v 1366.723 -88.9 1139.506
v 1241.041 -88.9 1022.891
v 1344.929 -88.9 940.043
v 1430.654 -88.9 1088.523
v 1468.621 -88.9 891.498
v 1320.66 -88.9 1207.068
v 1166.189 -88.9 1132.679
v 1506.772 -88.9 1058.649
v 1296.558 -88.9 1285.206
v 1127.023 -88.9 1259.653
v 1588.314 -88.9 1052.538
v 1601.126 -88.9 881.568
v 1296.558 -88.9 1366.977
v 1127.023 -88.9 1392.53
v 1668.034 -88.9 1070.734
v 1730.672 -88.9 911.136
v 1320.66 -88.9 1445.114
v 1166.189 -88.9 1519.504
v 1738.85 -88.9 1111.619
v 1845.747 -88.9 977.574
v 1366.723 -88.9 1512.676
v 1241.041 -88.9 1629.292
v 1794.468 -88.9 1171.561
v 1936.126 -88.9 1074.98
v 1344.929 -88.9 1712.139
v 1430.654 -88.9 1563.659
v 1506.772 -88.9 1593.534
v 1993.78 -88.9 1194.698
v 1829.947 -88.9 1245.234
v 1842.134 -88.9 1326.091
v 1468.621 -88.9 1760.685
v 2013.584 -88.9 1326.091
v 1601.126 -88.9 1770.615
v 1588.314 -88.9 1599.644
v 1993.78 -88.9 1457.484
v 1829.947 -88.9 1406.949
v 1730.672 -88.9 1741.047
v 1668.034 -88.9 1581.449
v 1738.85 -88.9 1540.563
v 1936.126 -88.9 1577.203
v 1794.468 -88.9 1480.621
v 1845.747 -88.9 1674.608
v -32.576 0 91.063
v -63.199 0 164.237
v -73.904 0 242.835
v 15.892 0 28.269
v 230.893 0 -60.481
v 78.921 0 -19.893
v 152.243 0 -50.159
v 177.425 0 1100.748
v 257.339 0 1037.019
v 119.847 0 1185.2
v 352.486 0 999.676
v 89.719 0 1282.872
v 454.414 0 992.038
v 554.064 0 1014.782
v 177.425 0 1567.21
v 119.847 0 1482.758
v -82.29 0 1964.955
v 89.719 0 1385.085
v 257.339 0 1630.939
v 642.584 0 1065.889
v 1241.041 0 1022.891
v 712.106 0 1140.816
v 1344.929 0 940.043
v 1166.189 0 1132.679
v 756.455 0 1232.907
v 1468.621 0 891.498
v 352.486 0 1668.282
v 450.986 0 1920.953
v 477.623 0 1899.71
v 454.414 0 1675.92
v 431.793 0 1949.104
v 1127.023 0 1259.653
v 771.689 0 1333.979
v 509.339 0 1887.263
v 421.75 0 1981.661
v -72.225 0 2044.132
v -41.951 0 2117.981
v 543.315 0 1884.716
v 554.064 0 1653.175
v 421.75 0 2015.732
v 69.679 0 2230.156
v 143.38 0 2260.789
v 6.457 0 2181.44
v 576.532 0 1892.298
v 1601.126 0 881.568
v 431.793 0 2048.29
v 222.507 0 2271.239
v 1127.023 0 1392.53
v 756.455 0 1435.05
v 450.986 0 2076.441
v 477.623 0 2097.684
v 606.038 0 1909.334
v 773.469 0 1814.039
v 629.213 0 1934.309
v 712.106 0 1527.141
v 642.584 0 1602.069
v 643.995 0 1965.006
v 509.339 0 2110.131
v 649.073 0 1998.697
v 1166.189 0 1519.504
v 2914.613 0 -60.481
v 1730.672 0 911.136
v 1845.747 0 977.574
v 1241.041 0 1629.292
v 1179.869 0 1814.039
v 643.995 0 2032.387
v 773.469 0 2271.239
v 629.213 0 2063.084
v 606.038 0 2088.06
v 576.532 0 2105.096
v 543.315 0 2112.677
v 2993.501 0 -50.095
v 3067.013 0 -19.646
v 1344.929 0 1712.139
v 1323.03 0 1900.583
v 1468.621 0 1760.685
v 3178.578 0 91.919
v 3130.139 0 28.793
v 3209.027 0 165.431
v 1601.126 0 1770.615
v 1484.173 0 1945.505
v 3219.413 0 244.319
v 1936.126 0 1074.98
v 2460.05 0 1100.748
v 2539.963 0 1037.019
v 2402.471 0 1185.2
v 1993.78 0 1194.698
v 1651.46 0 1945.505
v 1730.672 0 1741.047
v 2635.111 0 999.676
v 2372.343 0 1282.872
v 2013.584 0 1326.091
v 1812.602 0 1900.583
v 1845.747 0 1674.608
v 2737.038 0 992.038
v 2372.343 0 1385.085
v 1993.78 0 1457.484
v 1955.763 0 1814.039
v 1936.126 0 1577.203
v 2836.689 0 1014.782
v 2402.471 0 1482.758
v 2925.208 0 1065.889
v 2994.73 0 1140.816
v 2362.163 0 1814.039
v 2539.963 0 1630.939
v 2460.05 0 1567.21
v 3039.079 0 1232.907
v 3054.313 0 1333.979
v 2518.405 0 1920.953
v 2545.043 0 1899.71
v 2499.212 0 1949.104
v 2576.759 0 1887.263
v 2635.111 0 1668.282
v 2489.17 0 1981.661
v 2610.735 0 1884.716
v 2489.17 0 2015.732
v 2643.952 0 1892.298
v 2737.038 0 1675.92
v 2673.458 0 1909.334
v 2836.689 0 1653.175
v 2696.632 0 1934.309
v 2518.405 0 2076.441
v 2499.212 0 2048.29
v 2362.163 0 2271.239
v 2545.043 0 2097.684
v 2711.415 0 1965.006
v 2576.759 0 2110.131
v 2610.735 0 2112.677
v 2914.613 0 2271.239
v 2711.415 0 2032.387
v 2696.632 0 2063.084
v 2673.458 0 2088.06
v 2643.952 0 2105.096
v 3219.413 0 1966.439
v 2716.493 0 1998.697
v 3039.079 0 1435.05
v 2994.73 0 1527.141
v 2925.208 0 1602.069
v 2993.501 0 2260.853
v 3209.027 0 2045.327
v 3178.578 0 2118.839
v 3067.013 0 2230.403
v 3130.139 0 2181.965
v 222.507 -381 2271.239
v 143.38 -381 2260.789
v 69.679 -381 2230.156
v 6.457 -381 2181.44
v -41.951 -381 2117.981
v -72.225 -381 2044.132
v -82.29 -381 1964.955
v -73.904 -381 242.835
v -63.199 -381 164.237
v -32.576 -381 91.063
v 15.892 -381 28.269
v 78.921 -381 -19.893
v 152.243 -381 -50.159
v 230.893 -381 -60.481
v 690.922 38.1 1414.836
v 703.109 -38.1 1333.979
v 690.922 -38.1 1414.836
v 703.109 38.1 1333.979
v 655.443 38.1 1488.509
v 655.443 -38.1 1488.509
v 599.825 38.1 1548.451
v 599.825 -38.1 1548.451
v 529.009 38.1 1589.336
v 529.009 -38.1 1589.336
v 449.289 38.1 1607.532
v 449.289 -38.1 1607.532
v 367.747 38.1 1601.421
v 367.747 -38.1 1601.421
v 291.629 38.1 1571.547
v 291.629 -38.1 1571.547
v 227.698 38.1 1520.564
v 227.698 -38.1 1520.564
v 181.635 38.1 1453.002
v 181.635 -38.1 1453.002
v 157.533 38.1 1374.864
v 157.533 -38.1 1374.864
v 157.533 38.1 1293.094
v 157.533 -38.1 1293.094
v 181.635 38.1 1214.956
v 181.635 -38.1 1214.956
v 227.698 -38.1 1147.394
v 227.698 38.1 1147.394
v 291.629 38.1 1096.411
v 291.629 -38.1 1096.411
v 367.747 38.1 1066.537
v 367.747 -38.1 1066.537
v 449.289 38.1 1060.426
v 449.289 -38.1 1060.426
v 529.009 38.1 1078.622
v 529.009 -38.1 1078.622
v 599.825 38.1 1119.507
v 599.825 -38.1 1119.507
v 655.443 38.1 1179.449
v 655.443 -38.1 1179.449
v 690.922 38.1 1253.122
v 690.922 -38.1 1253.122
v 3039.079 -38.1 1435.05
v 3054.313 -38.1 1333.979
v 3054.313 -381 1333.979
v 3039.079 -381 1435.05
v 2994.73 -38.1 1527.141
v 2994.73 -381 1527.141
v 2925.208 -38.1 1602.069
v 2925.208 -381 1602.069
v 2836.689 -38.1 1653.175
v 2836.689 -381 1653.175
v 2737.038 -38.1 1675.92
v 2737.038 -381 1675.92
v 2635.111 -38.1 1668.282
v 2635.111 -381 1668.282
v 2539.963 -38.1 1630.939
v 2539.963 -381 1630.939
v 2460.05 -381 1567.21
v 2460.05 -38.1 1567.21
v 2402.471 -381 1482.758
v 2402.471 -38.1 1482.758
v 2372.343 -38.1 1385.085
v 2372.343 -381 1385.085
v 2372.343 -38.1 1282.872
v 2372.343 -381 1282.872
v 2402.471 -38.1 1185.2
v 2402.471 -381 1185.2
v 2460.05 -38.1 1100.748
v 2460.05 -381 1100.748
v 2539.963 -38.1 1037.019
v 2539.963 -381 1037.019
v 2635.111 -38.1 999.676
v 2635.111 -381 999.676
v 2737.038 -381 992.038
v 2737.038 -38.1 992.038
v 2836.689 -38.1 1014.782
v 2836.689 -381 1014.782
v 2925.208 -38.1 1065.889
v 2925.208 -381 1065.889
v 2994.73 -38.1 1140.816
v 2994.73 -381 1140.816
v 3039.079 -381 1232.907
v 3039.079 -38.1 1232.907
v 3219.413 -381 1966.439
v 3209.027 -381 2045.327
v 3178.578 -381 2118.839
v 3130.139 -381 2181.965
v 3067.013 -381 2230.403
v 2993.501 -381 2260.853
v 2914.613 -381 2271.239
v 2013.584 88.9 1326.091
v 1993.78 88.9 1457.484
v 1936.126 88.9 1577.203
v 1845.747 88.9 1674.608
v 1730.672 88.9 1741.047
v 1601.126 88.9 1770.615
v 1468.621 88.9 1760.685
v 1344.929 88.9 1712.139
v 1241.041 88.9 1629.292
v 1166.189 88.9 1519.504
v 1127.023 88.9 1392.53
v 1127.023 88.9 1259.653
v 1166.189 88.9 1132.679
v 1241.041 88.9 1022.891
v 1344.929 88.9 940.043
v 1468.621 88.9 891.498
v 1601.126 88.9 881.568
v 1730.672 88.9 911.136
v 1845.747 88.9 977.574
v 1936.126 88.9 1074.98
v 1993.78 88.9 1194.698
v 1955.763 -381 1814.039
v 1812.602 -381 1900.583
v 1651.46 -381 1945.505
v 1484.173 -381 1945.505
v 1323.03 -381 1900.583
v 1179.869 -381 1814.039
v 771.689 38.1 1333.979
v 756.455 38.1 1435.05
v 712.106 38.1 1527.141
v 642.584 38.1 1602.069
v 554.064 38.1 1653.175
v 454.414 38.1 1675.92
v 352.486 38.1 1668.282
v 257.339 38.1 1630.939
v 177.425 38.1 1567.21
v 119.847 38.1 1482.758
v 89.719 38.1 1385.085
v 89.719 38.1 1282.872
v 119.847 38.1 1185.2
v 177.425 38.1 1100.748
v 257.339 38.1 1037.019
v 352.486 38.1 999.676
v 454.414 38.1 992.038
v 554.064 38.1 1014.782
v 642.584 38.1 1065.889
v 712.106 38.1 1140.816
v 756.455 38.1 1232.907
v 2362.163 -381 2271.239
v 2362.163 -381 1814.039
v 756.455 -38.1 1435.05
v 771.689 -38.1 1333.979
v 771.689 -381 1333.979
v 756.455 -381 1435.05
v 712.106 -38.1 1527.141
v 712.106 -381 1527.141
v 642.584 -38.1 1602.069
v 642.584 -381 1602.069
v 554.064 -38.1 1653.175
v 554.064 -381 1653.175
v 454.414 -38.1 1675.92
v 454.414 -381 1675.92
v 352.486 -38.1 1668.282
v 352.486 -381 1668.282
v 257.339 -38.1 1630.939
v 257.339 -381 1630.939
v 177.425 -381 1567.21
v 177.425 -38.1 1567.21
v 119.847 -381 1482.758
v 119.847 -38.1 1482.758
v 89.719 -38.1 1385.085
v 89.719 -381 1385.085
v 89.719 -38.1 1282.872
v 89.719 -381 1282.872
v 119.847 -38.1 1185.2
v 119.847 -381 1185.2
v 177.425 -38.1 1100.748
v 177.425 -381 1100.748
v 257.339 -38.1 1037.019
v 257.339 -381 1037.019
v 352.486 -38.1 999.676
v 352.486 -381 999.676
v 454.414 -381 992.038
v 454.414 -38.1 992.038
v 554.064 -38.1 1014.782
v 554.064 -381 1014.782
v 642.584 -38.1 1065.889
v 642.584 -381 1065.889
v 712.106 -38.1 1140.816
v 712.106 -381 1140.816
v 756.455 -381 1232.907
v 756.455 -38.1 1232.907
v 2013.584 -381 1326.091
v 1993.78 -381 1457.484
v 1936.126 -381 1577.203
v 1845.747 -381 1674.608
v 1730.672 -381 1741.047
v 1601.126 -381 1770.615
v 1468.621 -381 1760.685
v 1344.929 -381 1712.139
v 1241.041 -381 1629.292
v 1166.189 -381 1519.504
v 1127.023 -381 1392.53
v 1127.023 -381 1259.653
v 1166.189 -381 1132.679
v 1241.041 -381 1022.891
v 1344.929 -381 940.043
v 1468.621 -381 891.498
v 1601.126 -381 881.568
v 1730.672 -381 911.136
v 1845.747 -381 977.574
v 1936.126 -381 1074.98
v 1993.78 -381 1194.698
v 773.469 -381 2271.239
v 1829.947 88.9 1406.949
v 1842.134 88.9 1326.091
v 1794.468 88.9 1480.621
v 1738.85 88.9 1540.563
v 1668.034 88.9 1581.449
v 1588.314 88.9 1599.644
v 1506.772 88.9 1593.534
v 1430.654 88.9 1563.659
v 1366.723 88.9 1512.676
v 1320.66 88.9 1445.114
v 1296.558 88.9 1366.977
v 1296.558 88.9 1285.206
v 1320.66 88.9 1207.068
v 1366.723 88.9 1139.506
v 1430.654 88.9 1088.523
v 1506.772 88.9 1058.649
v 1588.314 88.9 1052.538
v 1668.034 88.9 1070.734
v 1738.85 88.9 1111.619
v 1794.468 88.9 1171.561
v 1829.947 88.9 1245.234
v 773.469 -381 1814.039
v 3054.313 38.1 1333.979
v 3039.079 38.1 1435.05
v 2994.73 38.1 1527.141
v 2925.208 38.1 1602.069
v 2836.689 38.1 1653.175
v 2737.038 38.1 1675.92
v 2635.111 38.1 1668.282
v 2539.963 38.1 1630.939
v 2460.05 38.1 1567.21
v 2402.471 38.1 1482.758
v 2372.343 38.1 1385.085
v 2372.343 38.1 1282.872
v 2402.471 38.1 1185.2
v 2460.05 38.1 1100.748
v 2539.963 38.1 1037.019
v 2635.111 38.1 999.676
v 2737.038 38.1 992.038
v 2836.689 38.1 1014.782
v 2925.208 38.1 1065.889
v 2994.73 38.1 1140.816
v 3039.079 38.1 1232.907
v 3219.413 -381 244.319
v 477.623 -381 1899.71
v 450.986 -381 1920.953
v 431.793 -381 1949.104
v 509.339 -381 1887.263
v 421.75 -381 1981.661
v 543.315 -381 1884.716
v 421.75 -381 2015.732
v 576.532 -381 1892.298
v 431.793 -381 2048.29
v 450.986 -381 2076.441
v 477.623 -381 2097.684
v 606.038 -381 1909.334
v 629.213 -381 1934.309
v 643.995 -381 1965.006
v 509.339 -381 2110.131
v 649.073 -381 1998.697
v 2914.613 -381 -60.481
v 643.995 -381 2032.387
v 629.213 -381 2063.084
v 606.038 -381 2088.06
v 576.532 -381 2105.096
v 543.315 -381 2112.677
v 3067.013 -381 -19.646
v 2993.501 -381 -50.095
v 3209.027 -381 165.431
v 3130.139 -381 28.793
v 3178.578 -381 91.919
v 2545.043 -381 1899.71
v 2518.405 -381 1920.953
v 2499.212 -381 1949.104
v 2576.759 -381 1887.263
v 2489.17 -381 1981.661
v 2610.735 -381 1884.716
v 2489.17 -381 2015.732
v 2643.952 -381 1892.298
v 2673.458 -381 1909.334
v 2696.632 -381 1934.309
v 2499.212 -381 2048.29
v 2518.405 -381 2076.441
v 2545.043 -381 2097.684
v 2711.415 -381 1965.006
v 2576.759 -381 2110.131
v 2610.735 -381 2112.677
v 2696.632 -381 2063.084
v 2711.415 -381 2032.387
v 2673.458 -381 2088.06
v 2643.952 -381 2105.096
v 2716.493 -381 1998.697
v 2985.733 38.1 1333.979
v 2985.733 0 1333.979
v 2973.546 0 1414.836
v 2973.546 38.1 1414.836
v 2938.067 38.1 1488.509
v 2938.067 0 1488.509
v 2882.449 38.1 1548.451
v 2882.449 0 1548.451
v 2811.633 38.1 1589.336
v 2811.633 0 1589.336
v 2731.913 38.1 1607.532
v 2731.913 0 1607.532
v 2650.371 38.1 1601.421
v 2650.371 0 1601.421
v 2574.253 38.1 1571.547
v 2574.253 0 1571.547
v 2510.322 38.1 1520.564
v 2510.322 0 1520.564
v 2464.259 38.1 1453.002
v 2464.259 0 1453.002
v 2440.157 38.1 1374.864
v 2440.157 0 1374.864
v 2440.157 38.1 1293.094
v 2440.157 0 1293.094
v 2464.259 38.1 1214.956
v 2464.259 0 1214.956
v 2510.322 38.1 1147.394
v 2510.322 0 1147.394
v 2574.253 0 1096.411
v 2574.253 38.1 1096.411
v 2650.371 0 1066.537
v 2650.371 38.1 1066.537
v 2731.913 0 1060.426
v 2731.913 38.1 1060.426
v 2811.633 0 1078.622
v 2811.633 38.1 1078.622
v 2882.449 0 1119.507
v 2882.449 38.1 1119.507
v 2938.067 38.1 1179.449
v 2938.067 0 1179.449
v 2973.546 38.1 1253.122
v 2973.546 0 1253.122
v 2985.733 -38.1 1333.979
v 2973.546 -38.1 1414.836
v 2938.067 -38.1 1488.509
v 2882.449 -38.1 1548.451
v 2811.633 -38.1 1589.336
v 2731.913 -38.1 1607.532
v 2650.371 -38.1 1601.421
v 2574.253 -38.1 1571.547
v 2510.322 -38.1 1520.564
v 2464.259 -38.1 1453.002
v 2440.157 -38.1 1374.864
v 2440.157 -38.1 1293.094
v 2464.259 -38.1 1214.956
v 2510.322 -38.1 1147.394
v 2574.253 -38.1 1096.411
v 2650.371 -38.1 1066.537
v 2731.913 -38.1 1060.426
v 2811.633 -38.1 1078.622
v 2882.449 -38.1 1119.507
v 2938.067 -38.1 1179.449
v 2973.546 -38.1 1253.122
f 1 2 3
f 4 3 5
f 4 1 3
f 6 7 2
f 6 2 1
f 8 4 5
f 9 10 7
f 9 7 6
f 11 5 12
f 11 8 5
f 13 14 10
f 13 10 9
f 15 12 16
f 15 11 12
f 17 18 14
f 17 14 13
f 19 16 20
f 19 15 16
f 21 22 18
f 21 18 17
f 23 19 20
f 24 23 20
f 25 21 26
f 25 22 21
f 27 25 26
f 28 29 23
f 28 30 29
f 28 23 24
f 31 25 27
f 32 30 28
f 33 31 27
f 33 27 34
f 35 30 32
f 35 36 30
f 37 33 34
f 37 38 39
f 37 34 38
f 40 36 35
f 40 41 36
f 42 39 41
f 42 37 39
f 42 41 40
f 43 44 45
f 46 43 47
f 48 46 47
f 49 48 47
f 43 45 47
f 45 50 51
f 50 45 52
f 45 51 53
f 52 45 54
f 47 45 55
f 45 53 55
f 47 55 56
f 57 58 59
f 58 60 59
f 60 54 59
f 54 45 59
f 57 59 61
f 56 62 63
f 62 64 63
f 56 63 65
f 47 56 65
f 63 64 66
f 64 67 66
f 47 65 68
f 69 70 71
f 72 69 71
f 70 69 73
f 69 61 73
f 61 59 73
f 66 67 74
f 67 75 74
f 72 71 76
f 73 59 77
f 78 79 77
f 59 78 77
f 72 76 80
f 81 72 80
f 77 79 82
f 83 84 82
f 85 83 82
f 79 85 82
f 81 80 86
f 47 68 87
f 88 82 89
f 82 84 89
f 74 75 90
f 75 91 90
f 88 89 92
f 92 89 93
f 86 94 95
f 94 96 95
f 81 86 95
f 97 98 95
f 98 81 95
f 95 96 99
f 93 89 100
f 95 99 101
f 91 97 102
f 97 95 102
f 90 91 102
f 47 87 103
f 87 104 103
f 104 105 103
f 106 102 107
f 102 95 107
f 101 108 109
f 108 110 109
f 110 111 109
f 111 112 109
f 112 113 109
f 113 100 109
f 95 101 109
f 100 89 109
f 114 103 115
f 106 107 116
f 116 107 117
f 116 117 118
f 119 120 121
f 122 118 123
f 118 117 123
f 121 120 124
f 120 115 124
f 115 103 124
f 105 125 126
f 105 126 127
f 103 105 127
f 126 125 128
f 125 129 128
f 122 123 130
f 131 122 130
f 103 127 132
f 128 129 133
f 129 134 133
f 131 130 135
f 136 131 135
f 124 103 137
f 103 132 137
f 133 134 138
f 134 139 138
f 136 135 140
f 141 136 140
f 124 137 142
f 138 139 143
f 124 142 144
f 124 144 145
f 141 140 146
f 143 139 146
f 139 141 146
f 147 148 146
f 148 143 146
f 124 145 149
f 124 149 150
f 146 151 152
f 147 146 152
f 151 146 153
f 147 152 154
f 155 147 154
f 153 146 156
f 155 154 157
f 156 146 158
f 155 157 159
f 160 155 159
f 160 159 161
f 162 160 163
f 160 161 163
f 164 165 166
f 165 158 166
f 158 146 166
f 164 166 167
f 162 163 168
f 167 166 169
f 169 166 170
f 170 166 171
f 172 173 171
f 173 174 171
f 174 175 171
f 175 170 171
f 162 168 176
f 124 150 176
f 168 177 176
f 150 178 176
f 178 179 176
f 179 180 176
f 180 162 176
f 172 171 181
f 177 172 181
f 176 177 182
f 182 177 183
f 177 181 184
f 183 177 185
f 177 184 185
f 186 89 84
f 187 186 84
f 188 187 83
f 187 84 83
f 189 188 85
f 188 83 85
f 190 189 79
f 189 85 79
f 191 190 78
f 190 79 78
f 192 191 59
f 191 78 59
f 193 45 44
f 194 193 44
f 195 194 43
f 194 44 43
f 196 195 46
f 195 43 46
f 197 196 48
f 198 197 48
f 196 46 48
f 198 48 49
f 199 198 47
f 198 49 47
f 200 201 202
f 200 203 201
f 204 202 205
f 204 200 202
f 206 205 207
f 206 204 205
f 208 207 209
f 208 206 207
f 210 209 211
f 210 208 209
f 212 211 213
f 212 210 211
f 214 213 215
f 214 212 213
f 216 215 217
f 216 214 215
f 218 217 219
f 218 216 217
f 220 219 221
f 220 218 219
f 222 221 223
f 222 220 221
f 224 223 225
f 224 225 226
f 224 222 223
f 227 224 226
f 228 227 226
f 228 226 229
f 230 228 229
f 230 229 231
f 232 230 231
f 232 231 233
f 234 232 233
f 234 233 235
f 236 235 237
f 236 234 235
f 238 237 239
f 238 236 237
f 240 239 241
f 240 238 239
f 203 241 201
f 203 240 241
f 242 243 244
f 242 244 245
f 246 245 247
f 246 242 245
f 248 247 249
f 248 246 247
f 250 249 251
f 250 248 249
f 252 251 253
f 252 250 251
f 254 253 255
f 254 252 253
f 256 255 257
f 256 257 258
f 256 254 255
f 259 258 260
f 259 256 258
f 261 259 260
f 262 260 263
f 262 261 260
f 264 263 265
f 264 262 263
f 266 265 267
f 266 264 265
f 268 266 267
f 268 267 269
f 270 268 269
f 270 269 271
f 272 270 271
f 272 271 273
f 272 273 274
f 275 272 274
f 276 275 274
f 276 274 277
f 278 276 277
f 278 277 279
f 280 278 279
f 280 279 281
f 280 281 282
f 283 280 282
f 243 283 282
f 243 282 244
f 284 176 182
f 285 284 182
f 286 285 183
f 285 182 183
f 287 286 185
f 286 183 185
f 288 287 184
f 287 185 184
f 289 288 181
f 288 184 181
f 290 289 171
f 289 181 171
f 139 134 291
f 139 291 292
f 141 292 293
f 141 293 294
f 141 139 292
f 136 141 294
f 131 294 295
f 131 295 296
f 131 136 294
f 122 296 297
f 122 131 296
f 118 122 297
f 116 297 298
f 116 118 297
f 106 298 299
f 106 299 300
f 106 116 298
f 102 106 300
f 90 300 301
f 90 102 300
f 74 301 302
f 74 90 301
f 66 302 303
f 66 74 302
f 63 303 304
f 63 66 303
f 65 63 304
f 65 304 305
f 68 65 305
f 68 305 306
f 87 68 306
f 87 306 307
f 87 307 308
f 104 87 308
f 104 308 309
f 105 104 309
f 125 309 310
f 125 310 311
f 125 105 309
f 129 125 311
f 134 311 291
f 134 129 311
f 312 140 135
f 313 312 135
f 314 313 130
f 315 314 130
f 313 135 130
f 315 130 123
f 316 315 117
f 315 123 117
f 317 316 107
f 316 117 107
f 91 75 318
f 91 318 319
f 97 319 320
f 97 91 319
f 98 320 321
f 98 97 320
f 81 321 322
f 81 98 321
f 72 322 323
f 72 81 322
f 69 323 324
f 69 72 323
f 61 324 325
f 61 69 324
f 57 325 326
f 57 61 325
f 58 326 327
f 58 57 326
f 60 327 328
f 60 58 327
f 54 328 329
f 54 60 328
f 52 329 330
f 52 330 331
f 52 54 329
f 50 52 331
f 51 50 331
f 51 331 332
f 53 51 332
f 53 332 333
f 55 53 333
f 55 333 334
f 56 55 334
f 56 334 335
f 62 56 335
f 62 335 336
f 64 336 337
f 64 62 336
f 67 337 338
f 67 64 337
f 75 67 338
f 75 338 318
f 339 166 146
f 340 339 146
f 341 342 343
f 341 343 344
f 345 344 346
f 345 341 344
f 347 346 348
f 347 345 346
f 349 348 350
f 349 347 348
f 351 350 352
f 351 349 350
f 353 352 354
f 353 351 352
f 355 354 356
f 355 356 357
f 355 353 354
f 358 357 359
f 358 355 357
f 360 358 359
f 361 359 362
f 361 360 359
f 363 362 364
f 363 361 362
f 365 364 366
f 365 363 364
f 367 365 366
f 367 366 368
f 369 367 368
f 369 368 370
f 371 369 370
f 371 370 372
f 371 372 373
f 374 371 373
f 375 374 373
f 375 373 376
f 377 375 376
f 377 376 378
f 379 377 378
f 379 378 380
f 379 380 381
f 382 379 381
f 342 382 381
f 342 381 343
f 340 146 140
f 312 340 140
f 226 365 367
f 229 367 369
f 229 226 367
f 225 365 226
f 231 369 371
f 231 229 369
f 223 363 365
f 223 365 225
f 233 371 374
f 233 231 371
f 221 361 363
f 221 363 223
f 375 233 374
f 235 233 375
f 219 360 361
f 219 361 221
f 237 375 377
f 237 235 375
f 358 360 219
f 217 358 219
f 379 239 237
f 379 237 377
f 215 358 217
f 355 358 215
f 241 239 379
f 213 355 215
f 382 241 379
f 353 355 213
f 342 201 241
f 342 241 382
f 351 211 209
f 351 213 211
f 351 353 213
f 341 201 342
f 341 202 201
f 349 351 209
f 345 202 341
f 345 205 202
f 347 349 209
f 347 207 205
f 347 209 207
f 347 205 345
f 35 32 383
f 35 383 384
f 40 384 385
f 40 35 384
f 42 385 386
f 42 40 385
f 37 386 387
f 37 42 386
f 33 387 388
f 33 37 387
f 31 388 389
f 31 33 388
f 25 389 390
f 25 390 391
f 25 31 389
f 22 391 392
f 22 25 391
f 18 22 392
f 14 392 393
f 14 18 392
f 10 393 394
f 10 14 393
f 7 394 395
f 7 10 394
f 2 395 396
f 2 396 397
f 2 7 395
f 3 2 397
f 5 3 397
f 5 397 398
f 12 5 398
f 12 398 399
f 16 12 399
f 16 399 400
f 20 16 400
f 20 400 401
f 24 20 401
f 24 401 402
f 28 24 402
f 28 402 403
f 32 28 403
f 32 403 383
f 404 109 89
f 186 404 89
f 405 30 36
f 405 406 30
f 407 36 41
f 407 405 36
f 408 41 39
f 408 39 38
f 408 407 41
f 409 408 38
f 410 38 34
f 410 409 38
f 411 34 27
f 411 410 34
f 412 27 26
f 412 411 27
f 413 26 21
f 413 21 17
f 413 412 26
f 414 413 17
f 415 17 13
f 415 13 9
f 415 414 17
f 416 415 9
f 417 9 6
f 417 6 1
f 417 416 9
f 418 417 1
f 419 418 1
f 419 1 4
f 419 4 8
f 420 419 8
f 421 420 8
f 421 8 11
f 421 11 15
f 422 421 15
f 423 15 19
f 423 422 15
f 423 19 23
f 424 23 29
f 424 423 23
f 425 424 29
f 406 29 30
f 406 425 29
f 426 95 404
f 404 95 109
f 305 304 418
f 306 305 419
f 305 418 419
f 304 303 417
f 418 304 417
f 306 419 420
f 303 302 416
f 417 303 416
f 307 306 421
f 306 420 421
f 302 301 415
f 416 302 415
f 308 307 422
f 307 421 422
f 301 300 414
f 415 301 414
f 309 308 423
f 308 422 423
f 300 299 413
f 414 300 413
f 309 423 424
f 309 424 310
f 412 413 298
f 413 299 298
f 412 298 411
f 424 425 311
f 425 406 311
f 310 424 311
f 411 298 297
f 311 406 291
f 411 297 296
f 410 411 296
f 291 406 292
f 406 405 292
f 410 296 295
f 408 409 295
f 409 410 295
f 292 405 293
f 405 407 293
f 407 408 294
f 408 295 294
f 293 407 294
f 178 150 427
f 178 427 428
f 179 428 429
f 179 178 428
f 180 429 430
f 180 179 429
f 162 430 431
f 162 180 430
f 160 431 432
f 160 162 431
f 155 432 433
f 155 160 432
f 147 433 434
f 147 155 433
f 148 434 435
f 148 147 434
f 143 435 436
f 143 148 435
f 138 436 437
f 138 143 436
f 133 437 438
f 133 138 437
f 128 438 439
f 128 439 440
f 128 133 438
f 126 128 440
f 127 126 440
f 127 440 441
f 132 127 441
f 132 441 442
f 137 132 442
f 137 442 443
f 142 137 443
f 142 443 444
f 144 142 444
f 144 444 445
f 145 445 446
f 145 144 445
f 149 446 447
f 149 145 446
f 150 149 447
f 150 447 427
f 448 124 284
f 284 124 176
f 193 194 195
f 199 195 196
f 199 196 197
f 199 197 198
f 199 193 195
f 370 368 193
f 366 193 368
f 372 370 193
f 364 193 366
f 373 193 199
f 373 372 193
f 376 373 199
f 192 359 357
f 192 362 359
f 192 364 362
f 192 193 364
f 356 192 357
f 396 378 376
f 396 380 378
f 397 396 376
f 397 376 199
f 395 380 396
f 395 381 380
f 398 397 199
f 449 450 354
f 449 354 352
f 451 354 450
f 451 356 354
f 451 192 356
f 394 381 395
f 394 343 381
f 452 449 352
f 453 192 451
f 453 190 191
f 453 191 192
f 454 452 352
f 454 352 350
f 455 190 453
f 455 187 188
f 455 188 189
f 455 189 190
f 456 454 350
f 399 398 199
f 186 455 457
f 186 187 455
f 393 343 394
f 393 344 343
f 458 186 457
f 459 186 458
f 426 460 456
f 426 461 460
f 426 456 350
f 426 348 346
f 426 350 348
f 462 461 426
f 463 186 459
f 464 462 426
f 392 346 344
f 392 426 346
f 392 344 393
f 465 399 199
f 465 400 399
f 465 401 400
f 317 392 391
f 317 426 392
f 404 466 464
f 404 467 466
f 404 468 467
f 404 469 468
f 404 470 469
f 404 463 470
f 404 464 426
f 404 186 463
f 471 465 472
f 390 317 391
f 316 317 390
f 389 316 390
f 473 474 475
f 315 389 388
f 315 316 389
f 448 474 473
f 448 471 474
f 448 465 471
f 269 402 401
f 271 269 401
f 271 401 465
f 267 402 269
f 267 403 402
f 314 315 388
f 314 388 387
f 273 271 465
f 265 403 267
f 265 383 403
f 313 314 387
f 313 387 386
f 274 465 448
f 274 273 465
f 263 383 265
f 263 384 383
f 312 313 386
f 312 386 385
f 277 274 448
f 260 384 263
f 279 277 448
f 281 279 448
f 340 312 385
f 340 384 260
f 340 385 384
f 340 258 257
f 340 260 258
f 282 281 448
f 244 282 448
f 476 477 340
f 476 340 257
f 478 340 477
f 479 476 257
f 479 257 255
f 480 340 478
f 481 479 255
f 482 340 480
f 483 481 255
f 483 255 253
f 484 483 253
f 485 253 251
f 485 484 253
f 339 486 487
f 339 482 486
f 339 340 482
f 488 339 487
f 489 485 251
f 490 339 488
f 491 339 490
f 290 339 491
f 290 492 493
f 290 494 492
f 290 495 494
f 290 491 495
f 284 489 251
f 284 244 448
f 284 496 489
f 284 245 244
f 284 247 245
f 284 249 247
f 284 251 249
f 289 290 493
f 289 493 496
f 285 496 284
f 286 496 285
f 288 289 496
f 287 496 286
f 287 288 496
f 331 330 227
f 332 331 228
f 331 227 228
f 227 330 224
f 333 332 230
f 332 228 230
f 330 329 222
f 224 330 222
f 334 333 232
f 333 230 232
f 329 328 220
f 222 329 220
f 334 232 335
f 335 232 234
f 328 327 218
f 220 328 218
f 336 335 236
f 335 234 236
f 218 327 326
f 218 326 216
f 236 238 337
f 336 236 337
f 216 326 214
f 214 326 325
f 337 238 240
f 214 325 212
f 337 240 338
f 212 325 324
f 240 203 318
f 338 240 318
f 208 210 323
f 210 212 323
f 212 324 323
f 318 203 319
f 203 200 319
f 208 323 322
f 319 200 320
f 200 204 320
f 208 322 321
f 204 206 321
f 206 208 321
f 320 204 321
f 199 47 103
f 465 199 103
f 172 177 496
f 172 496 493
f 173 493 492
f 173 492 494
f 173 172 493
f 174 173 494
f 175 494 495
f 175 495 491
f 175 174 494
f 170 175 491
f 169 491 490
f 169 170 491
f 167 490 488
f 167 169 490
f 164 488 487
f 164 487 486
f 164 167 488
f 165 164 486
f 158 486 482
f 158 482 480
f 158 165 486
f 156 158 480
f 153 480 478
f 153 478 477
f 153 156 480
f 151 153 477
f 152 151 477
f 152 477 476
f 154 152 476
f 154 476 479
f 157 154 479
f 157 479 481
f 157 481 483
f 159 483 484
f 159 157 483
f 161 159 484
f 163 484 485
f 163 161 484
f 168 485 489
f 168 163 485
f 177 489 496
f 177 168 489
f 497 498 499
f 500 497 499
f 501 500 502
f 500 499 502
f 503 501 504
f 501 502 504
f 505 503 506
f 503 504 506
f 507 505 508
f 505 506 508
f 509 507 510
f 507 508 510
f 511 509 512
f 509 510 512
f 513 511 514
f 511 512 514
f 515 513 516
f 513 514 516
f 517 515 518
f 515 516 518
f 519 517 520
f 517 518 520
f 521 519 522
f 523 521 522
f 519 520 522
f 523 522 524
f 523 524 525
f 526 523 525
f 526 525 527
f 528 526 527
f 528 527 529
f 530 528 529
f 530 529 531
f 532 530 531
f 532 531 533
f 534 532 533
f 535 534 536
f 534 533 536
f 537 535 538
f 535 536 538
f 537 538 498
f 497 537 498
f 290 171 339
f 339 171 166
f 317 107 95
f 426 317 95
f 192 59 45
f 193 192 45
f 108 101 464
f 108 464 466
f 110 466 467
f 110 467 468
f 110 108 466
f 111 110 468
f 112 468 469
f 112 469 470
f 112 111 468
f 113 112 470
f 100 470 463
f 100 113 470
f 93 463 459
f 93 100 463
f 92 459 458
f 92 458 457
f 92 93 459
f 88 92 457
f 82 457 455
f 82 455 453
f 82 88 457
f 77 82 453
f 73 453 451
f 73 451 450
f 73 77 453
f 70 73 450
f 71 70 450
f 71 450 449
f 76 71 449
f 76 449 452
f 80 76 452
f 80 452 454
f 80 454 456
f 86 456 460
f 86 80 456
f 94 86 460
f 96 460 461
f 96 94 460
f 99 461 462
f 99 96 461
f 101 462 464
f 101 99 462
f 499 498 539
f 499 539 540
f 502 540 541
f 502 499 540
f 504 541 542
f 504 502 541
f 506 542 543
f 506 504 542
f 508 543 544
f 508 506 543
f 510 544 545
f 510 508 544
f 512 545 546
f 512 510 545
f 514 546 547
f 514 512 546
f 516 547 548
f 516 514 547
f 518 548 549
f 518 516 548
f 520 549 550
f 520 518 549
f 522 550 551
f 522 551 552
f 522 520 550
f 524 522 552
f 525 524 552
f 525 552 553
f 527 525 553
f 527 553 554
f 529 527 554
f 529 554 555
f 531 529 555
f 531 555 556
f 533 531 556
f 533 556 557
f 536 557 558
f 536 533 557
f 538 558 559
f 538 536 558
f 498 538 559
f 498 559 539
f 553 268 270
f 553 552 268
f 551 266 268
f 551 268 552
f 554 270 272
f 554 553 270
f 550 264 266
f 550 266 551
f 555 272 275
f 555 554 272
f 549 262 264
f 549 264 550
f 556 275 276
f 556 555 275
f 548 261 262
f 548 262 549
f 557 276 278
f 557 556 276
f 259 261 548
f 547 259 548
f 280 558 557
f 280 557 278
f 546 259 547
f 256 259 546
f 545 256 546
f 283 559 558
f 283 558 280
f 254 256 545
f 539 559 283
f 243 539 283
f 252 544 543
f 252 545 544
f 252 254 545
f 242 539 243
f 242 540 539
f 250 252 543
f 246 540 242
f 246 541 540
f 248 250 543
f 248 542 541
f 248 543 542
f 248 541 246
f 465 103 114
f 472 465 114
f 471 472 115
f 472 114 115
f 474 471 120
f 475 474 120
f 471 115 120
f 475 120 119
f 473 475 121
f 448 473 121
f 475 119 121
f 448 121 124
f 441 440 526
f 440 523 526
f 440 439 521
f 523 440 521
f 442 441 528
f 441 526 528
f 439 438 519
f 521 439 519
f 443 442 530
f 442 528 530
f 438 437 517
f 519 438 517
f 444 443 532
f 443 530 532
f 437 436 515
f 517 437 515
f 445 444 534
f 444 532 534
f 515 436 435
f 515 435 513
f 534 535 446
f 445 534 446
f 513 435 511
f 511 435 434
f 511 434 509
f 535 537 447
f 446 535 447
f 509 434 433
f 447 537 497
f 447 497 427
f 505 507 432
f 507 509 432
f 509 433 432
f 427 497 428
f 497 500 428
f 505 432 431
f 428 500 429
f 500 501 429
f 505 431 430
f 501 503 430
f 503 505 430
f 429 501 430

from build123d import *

# Parameters (mm, degrees)
F0_R     = 342.9
F0_R_2   = 445.77
F0_R_3   = 114.3
F1_DEPTH = 381
F0_R_4   = 274.32
F2_DEPTH = 88.9
F3_DEPTH = 38.1


with BuildPart() as f1:
    # F0 (on Front) → F1 (new body)
    with BuildSketch(Plane.XZ):
        with BuildLine():
            ThreePointArc((-73.903867776, 242.8346680415), (15.8917497981, 28.2686029567), (230.8925186905, -60.4811497033))
            Line((230.8925186905, -60.4811497033), (2914.6131049652, -60.4811497033))
            ThreePointArc((2914.6131049652, -60.4811497033), (3130.1392518708, 28.7927033911), (3219.4131049652, 244.3188502967))
            Line((3219.4131049652, 244.3188502967), (3219.4131049652, 1966.4388502967))
            ThreePointArc((3219.4131049652, 1966.4388502967), (3130.1392518708, 2181.9649972024), (2914.6131049652, 2271.2388502967))
            Line((2914.6131049652, 2271.2388502967), (2362.1631049652, 2271.2388502967))
            Line((2362.1631049652, 2271.2388502967), (2362.1631049652, 1814.0388502967))
            Line((2362.1631049652, 1814.0388502967), (1955.7631049652, 1814.0388502967))
            ThreePointArc((1955.7631049652, 1814.0388502967), (1567.816040535, 1951.1988502967), (1179.8689761048, 1814.0388502967))
            Line((1179.8689761048, 1814.0388502967), (773.4689761048, 1814.0388502967))
            Line((773.4689761048, 1814.0388502967), (773.4689761048, 2271.2388502967))
            Line((773.4689761048, 2271.2388502967), (222.5067895322, 2271.2388502967))
            ThreePointArc((222.5067895322, 2271.2388502967), (6.4565421921, 2181.4396191891), (-82.2895969343, 1964.9546680415))
            Line((-82.2895969343, 1964.9546680415), (-73.903867776, 242.8346680415))
        make_face()
        with Locations((428.7889132739, 1333.9788502967)):
            Circle(F0_R, mode=Mode.SUBTRACT)
        with Locations((1567.8138927922, 1326.0913376031)):
            Circle(F0_R_2, mode=Mode.SUBTRACT)
        with Locations((534.7734156303, 1998.6968502967)):
            Circle(F0_R_3, mode=Mode.SUBTRACT)
        with Locations((2711.4131049652, 1333.9788502967)):
            Circle(F0_R, mode=Mode.SUBTRACT)
        with Locations((2602.1931049652, 1998.6968502967)):
            Circle(F0_R_3, mode=Mode.SUBTRACT)
    extrude(amount=F1_DEPTH)

    # F0 (on Front) → F2 (join, symmetric)
    with BuildSketch(Plane.XZ):
        with Locations((1567.8138927922, 1326.0913376031)):
            Circle(F0_R_2)
        with Locations((1567.8138927922, 1326.0913376031)):
            Circle(F0_R_4, mode=Mode.SUBTRACT)
    extrude(amount=F2_DEPTH, both=True)

    # F0 (on Front) → F3 (join, symmetric)
    with BuildSketch(Plane.XZ):
        with Locations((2711.4131049652, 1333.9788502967)):
            Circle(F0_R)
        with Locations((2711.4131049652, 1333.9788502967)):
            Circle(F0_R_4, mode=Mode.SUBTRACT)
        with Locations((428.7889132739, 1333.9788502967)):
            Circle(F0_R)
        with Locations((428.7889132739, 1333.9788502967)):
            Circle(F0_R_4, mode=Mode.SUBTRACT)
    extrude(amount=F3_DEPTH, both=True)


solid = f1.part
